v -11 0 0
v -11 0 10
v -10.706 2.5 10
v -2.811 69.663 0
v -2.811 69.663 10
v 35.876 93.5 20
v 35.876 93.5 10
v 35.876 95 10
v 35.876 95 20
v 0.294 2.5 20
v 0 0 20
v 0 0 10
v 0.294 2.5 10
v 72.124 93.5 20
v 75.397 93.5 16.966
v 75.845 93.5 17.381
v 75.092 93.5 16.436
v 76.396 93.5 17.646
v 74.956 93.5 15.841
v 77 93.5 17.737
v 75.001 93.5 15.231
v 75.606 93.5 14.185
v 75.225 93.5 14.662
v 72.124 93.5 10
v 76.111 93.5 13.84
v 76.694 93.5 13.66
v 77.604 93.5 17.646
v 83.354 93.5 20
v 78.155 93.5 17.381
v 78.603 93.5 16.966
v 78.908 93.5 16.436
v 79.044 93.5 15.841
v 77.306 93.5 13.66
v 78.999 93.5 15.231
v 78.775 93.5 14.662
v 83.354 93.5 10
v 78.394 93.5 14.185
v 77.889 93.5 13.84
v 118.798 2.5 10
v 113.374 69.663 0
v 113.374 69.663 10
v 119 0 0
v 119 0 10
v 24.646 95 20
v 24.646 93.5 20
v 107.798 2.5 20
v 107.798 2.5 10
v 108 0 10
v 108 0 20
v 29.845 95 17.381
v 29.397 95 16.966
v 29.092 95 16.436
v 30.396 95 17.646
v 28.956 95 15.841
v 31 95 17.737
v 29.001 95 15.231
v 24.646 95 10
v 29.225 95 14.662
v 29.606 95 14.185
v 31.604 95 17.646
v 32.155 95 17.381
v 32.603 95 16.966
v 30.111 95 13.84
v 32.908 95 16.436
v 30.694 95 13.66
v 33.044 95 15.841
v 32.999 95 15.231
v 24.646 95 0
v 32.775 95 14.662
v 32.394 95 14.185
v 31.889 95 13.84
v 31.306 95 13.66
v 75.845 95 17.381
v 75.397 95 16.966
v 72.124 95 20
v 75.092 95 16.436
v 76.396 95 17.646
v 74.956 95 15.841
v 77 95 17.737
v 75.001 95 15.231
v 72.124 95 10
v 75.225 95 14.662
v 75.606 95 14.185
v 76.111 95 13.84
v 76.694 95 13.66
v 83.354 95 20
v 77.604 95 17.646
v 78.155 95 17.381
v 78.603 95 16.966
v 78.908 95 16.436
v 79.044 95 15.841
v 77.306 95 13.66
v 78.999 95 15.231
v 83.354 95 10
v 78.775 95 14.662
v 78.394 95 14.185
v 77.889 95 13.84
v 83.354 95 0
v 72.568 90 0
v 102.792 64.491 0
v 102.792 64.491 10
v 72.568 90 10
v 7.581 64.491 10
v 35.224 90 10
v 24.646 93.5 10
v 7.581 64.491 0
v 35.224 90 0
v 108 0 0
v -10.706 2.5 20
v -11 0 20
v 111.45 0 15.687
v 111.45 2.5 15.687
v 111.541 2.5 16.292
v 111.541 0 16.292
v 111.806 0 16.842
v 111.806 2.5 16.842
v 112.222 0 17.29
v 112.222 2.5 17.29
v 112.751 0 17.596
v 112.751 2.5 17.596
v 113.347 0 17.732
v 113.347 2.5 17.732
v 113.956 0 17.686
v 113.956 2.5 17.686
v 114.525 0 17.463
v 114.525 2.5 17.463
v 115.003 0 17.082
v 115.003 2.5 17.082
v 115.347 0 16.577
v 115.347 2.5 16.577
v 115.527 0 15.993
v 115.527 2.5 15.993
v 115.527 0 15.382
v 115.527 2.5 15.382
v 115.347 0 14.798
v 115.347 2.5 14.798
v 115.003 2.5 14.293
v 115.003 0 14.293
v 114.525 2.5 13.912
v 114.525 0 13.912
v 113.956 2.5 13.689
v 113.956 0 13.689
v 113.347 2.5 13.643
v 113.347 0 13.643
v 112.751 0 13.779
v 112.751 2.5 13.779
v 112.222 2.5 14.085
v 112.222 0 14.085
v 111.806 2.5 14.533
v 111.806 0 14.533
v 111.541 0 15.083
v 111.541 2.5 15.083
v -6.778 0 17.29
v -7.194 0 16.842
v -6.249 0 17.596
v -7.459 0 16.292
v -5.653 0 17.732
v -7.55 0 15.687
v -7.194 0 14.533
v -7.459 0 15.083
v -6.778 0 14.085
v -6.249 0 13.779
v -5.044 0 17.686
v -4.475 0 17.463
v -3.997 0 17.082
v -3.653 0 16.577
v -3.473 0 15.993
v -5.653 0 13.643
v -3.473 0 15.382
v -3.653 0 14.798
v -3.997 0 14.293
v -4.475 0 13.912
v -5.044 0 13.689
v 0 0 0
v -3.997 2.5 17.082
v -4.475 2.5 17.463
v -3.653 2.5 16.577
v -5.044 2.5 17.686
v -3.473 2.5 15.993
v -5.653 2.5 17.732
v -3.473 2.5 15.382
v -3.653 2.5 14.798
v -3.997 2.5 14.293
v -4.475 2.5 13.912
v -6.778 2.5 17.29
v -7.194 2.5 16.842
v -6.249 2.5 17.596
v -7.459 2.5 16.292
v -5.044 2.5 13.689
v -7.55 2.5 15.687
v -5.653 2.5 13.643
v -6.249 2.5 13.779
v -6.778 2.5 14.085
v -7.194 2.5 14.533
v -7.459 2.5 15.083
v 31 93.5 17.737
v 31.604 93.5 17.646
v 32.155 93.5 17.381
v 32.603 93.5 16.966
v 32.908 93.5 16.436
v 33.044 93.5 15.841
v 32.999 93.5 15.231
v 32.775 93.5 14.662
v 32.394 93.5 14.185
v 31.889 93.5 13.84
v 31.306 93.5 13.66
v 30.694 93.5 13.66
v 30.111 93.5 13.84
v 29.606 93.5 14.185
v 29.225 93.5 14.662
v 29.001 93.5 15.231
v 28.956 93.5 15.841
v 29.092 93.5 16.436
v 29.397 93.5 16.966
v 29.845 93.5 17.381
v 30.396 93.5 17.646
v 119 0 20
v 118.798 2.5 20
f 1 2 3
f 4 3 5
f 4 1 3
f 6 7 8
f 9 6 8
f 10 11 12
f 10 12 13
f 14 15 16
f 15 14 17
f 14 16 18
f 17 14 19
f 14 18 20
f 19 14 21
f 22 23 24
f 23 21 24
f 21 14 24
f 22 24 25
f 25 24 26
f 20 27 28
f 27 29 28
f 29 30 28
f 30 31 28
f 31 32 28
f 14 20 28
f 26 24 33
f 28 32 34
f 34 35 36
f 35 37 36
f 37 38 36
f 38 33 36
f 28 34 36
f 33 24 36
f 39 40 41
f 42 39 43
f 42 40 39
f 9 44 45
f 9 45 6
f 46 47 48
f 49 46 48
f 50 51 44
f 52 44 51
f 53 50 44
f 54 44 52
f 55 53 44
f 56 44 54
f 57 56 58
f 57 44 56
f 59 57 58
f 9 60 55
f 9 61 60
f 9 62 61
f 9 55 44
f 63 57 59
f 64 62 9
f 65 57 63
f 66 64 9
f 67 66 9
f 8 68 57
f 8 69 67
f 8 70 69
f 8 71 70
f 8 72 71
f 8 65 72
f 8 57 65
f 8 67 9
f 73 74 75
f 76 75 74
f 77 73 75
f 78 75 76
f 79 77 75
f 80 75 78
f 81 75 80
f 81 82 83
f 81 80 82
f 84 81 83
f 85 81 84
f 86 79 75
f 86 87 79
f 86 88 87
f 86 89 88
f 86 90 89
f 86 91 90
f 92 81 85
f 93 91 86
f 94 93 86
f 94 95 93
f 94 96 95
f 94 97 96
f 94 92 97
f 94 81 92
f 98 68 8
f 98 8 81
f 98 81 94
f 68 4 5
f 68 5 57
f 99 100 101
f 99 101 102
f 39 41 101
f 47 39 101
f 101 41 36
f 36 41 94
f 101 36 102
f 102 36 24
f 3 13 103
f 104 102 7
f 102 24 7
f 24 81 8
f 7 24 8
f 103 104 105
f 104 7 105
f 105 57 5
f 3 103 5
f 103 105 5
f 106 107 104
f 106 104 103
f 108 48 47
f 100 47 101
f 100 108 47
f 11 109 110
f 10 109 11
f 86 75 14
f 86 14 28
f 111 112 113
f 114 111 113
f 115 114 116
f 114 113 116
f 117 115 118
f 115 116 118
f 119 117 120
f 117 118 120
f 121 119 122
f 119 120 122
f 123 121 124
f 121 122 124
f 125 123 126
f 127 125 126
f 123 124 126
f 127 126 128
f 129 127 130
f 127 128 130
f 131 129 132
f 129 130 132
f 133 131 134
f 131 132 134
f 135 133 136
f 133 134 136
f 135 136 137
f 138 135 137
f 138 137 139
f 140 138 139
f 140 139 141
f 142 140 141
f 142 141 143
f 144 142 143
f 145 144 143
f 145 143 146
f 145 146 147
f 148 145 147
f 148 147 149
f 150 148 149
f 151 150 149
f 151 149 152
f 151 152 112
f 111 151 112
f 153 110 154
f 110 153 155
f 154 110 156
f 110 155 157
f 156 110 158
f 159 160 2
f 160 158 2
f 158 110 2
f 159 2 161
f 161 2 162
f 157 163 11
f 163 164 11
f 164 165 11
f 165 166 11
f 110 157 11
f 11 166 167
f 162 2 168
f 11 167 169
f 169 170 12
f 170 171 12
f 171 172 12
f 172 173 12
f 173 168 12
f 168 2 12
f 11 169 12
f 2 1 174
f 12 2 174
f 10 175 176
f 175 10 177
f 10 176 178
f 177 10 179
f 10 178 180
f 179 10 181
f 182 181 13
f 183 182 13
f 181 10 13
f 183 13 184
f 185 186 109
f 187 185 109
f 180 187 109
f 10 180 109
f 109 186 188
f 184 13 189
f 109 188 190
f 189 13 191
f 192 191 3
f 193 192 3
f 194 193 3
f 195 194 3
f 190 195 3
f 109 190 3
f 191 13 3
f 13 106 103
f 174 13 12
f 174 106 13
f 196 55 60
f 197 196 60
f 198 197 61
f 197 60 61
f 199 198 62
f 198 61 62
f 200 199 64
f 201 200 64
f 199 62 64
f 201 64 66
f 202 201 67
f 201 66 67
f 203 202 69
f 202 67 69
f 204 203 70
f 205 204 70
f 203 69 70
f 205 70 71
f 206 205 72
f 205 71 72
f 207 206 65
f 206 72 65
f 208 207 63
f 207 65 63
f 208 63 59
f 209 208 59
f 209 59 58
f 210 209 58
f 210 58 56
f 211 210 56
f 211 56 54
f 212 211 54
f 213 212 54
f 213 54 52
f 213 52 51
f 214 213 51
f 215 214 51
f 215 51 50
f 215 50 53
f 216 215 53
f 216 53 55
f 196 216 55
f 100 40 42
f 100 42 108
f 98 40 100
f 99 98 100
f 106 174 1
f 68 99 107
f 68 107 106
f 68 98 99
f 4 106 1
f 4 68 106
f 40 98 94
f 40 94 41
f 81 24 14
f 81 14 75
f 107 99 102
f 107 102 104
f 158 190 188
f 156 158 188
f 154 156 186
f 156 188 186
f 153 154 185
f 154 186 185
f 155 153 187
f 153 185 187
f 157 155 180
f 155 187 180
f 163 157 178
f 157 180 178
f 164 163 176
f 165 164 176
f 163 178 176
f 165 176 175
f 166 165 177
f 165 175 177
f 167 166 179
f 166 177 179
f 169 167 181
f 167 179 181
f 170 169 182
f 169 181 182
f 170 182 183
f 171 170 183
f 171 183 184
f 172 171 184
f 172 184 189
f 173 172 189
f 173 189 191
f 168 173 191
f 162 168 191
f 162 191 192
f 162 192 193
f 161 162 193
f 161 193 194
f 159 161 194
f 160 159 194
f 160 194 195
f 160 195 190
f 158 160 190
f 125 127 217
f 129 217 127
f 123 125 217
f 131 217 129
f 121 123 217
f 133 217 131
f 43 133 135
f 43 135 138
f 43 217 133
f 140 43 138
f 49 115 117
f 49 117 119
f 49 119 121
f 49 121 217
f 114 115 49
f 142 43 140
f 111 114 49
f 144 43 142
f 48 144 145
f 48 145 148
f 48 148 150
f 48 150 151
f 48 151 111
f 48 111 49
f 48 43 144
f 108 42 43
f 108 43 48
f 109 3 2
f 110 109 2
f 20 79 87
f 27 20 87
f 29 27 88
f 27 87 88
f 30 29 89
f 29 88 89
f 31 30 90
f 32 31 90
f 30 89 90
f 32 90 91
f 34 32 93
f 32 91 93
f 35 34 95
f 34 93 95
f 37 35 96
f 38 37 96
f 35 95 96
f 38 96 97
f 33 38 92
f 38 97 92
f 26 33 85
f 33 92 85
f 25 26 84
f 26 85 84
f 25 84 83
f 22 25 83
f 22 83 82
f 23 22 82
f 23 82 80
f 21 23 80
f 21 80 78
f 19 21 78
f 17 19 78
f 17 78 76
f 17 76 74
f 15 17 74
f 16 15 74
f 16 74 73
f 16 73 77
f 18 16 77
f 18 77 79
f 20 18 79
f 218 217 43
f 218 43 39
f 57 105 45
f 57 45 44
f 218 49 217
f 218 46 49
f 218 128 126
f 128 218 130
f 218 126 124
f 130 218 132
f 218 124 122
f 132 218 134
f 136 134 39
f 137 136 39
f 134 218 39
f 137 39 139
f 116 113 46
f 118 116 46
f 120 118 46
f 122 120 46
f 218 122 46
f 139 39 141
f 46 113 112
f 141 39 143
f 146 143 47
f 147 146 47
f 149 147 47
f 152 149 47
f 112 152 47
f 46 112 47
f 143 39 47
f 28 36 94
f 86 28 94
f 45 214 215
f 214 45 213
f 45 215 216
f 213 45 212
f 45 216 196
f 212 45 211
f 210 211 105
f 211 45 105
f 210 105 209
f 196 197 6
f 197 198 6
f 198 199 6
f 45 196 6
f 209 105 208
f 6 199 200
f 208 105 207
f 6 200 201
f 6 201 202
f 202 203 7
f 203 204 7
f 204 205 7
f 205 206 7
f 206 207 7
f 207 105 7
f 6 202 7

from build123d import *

# Parameters (mm, degrees)
BOSS_EXTRUDE1_DEPTH = 10
BOSS_EXTRUDE2_DEPTH = 10
SKETCH3_R           = 2.05
CUT_EXTRUDE1_DEPTH  = 10
SKETCH4_W           = 11.229416436
SKETCH4_H           = 1.5
BOSS_EXTRUDE3_DEPTH = 10
SKETCH6_R           = 2.05
CUT_EXTRUDE2_DEPTH  = 10


with BuildPart() as part:
    # Sketch1 → Boss-Extrude1 (new body)
    with BuildSketch(Plane.XY):
        Polygon((0, 0), (-11, 0), (-2.811023481, 69.662685047), (24.646347311, 95), (83.353652689, 95), (113.374131029, 69.662685047), (119, 0), (108, 0), (102.791775395, 64.491176779), (72.568088456, 90), (35.224285945, 90), (7.581056228, 64.491176779), align=None)
    extrude(amount=BOSS_EXTRUDE1_DEPTH)

    # Sketch2 → Boss-Extrude2 (add)
    with BuildSketch(Plane.XY.offset(10)):
        Polygon((-11, 0), (0, 0), (0.29387959, 2.5), (-10.70612041, 2.5), align=None)
        Polygon((108, 0), (119, 0), (118.798103211, 2.5), (107.798103211, 2.5), align=None)
    extrude(amount=BOSS_EXTRUDE2_DEPTH)

    # Sketch3 → Cut-Extrude1 (cut)
    with BuildSketch(Plane(origin=(0, 2.5, 0), x_dir=(1, 0, 0), z_dir=(0, 1, 0))):
        with Locations(Location((-5.5, -15.687372709, 0), (0, 0, 180))):
            Circle(SKETCH3_R)
        with Locations(Location((113.5, -15.687372709, 0), (0, 0, 180))):
            Circle(SKETCH3_R)
    extrude(amount=-CUT_EXTRUDE1_DEPTH, mode=Mode.SUBTRACT)

    # Sketch4 → Boss-Extrude3 (add)
    with BuildSketch(Plane.XY.offset(10)):
        with Locations((30.261055529, 94.25)):
            Rectangle(SKETCH4_W, SKETCH4_H)
        with Locations((77.738944471, 94.25)):
            Rectangle(SKETCH4_W, SKETCH4_H)
    extrude(amount=BOSS_EXTRUDE3_DEPTH)

    # Sketch6 → Cut-Extrude2 (cut)
    with BuildSketch(Plane(origin=(0, 95, 0), x_dir=(1, 0, 0), z_dir=(0, 1, 0))):
        with Locations(Location((31, -15.687372709, 0), (0, 0, 270))):
            Circle(SKETCH6_R)
        with Locations(Location((77, -15.687372709, 0), (0, 0, 270))):
            Circle(SKETCH6_R)
    extrude(amount=-CUT_EXTRUDE2_DEPTH, mode=Mode.SUBTRACT)


solid = part.part
